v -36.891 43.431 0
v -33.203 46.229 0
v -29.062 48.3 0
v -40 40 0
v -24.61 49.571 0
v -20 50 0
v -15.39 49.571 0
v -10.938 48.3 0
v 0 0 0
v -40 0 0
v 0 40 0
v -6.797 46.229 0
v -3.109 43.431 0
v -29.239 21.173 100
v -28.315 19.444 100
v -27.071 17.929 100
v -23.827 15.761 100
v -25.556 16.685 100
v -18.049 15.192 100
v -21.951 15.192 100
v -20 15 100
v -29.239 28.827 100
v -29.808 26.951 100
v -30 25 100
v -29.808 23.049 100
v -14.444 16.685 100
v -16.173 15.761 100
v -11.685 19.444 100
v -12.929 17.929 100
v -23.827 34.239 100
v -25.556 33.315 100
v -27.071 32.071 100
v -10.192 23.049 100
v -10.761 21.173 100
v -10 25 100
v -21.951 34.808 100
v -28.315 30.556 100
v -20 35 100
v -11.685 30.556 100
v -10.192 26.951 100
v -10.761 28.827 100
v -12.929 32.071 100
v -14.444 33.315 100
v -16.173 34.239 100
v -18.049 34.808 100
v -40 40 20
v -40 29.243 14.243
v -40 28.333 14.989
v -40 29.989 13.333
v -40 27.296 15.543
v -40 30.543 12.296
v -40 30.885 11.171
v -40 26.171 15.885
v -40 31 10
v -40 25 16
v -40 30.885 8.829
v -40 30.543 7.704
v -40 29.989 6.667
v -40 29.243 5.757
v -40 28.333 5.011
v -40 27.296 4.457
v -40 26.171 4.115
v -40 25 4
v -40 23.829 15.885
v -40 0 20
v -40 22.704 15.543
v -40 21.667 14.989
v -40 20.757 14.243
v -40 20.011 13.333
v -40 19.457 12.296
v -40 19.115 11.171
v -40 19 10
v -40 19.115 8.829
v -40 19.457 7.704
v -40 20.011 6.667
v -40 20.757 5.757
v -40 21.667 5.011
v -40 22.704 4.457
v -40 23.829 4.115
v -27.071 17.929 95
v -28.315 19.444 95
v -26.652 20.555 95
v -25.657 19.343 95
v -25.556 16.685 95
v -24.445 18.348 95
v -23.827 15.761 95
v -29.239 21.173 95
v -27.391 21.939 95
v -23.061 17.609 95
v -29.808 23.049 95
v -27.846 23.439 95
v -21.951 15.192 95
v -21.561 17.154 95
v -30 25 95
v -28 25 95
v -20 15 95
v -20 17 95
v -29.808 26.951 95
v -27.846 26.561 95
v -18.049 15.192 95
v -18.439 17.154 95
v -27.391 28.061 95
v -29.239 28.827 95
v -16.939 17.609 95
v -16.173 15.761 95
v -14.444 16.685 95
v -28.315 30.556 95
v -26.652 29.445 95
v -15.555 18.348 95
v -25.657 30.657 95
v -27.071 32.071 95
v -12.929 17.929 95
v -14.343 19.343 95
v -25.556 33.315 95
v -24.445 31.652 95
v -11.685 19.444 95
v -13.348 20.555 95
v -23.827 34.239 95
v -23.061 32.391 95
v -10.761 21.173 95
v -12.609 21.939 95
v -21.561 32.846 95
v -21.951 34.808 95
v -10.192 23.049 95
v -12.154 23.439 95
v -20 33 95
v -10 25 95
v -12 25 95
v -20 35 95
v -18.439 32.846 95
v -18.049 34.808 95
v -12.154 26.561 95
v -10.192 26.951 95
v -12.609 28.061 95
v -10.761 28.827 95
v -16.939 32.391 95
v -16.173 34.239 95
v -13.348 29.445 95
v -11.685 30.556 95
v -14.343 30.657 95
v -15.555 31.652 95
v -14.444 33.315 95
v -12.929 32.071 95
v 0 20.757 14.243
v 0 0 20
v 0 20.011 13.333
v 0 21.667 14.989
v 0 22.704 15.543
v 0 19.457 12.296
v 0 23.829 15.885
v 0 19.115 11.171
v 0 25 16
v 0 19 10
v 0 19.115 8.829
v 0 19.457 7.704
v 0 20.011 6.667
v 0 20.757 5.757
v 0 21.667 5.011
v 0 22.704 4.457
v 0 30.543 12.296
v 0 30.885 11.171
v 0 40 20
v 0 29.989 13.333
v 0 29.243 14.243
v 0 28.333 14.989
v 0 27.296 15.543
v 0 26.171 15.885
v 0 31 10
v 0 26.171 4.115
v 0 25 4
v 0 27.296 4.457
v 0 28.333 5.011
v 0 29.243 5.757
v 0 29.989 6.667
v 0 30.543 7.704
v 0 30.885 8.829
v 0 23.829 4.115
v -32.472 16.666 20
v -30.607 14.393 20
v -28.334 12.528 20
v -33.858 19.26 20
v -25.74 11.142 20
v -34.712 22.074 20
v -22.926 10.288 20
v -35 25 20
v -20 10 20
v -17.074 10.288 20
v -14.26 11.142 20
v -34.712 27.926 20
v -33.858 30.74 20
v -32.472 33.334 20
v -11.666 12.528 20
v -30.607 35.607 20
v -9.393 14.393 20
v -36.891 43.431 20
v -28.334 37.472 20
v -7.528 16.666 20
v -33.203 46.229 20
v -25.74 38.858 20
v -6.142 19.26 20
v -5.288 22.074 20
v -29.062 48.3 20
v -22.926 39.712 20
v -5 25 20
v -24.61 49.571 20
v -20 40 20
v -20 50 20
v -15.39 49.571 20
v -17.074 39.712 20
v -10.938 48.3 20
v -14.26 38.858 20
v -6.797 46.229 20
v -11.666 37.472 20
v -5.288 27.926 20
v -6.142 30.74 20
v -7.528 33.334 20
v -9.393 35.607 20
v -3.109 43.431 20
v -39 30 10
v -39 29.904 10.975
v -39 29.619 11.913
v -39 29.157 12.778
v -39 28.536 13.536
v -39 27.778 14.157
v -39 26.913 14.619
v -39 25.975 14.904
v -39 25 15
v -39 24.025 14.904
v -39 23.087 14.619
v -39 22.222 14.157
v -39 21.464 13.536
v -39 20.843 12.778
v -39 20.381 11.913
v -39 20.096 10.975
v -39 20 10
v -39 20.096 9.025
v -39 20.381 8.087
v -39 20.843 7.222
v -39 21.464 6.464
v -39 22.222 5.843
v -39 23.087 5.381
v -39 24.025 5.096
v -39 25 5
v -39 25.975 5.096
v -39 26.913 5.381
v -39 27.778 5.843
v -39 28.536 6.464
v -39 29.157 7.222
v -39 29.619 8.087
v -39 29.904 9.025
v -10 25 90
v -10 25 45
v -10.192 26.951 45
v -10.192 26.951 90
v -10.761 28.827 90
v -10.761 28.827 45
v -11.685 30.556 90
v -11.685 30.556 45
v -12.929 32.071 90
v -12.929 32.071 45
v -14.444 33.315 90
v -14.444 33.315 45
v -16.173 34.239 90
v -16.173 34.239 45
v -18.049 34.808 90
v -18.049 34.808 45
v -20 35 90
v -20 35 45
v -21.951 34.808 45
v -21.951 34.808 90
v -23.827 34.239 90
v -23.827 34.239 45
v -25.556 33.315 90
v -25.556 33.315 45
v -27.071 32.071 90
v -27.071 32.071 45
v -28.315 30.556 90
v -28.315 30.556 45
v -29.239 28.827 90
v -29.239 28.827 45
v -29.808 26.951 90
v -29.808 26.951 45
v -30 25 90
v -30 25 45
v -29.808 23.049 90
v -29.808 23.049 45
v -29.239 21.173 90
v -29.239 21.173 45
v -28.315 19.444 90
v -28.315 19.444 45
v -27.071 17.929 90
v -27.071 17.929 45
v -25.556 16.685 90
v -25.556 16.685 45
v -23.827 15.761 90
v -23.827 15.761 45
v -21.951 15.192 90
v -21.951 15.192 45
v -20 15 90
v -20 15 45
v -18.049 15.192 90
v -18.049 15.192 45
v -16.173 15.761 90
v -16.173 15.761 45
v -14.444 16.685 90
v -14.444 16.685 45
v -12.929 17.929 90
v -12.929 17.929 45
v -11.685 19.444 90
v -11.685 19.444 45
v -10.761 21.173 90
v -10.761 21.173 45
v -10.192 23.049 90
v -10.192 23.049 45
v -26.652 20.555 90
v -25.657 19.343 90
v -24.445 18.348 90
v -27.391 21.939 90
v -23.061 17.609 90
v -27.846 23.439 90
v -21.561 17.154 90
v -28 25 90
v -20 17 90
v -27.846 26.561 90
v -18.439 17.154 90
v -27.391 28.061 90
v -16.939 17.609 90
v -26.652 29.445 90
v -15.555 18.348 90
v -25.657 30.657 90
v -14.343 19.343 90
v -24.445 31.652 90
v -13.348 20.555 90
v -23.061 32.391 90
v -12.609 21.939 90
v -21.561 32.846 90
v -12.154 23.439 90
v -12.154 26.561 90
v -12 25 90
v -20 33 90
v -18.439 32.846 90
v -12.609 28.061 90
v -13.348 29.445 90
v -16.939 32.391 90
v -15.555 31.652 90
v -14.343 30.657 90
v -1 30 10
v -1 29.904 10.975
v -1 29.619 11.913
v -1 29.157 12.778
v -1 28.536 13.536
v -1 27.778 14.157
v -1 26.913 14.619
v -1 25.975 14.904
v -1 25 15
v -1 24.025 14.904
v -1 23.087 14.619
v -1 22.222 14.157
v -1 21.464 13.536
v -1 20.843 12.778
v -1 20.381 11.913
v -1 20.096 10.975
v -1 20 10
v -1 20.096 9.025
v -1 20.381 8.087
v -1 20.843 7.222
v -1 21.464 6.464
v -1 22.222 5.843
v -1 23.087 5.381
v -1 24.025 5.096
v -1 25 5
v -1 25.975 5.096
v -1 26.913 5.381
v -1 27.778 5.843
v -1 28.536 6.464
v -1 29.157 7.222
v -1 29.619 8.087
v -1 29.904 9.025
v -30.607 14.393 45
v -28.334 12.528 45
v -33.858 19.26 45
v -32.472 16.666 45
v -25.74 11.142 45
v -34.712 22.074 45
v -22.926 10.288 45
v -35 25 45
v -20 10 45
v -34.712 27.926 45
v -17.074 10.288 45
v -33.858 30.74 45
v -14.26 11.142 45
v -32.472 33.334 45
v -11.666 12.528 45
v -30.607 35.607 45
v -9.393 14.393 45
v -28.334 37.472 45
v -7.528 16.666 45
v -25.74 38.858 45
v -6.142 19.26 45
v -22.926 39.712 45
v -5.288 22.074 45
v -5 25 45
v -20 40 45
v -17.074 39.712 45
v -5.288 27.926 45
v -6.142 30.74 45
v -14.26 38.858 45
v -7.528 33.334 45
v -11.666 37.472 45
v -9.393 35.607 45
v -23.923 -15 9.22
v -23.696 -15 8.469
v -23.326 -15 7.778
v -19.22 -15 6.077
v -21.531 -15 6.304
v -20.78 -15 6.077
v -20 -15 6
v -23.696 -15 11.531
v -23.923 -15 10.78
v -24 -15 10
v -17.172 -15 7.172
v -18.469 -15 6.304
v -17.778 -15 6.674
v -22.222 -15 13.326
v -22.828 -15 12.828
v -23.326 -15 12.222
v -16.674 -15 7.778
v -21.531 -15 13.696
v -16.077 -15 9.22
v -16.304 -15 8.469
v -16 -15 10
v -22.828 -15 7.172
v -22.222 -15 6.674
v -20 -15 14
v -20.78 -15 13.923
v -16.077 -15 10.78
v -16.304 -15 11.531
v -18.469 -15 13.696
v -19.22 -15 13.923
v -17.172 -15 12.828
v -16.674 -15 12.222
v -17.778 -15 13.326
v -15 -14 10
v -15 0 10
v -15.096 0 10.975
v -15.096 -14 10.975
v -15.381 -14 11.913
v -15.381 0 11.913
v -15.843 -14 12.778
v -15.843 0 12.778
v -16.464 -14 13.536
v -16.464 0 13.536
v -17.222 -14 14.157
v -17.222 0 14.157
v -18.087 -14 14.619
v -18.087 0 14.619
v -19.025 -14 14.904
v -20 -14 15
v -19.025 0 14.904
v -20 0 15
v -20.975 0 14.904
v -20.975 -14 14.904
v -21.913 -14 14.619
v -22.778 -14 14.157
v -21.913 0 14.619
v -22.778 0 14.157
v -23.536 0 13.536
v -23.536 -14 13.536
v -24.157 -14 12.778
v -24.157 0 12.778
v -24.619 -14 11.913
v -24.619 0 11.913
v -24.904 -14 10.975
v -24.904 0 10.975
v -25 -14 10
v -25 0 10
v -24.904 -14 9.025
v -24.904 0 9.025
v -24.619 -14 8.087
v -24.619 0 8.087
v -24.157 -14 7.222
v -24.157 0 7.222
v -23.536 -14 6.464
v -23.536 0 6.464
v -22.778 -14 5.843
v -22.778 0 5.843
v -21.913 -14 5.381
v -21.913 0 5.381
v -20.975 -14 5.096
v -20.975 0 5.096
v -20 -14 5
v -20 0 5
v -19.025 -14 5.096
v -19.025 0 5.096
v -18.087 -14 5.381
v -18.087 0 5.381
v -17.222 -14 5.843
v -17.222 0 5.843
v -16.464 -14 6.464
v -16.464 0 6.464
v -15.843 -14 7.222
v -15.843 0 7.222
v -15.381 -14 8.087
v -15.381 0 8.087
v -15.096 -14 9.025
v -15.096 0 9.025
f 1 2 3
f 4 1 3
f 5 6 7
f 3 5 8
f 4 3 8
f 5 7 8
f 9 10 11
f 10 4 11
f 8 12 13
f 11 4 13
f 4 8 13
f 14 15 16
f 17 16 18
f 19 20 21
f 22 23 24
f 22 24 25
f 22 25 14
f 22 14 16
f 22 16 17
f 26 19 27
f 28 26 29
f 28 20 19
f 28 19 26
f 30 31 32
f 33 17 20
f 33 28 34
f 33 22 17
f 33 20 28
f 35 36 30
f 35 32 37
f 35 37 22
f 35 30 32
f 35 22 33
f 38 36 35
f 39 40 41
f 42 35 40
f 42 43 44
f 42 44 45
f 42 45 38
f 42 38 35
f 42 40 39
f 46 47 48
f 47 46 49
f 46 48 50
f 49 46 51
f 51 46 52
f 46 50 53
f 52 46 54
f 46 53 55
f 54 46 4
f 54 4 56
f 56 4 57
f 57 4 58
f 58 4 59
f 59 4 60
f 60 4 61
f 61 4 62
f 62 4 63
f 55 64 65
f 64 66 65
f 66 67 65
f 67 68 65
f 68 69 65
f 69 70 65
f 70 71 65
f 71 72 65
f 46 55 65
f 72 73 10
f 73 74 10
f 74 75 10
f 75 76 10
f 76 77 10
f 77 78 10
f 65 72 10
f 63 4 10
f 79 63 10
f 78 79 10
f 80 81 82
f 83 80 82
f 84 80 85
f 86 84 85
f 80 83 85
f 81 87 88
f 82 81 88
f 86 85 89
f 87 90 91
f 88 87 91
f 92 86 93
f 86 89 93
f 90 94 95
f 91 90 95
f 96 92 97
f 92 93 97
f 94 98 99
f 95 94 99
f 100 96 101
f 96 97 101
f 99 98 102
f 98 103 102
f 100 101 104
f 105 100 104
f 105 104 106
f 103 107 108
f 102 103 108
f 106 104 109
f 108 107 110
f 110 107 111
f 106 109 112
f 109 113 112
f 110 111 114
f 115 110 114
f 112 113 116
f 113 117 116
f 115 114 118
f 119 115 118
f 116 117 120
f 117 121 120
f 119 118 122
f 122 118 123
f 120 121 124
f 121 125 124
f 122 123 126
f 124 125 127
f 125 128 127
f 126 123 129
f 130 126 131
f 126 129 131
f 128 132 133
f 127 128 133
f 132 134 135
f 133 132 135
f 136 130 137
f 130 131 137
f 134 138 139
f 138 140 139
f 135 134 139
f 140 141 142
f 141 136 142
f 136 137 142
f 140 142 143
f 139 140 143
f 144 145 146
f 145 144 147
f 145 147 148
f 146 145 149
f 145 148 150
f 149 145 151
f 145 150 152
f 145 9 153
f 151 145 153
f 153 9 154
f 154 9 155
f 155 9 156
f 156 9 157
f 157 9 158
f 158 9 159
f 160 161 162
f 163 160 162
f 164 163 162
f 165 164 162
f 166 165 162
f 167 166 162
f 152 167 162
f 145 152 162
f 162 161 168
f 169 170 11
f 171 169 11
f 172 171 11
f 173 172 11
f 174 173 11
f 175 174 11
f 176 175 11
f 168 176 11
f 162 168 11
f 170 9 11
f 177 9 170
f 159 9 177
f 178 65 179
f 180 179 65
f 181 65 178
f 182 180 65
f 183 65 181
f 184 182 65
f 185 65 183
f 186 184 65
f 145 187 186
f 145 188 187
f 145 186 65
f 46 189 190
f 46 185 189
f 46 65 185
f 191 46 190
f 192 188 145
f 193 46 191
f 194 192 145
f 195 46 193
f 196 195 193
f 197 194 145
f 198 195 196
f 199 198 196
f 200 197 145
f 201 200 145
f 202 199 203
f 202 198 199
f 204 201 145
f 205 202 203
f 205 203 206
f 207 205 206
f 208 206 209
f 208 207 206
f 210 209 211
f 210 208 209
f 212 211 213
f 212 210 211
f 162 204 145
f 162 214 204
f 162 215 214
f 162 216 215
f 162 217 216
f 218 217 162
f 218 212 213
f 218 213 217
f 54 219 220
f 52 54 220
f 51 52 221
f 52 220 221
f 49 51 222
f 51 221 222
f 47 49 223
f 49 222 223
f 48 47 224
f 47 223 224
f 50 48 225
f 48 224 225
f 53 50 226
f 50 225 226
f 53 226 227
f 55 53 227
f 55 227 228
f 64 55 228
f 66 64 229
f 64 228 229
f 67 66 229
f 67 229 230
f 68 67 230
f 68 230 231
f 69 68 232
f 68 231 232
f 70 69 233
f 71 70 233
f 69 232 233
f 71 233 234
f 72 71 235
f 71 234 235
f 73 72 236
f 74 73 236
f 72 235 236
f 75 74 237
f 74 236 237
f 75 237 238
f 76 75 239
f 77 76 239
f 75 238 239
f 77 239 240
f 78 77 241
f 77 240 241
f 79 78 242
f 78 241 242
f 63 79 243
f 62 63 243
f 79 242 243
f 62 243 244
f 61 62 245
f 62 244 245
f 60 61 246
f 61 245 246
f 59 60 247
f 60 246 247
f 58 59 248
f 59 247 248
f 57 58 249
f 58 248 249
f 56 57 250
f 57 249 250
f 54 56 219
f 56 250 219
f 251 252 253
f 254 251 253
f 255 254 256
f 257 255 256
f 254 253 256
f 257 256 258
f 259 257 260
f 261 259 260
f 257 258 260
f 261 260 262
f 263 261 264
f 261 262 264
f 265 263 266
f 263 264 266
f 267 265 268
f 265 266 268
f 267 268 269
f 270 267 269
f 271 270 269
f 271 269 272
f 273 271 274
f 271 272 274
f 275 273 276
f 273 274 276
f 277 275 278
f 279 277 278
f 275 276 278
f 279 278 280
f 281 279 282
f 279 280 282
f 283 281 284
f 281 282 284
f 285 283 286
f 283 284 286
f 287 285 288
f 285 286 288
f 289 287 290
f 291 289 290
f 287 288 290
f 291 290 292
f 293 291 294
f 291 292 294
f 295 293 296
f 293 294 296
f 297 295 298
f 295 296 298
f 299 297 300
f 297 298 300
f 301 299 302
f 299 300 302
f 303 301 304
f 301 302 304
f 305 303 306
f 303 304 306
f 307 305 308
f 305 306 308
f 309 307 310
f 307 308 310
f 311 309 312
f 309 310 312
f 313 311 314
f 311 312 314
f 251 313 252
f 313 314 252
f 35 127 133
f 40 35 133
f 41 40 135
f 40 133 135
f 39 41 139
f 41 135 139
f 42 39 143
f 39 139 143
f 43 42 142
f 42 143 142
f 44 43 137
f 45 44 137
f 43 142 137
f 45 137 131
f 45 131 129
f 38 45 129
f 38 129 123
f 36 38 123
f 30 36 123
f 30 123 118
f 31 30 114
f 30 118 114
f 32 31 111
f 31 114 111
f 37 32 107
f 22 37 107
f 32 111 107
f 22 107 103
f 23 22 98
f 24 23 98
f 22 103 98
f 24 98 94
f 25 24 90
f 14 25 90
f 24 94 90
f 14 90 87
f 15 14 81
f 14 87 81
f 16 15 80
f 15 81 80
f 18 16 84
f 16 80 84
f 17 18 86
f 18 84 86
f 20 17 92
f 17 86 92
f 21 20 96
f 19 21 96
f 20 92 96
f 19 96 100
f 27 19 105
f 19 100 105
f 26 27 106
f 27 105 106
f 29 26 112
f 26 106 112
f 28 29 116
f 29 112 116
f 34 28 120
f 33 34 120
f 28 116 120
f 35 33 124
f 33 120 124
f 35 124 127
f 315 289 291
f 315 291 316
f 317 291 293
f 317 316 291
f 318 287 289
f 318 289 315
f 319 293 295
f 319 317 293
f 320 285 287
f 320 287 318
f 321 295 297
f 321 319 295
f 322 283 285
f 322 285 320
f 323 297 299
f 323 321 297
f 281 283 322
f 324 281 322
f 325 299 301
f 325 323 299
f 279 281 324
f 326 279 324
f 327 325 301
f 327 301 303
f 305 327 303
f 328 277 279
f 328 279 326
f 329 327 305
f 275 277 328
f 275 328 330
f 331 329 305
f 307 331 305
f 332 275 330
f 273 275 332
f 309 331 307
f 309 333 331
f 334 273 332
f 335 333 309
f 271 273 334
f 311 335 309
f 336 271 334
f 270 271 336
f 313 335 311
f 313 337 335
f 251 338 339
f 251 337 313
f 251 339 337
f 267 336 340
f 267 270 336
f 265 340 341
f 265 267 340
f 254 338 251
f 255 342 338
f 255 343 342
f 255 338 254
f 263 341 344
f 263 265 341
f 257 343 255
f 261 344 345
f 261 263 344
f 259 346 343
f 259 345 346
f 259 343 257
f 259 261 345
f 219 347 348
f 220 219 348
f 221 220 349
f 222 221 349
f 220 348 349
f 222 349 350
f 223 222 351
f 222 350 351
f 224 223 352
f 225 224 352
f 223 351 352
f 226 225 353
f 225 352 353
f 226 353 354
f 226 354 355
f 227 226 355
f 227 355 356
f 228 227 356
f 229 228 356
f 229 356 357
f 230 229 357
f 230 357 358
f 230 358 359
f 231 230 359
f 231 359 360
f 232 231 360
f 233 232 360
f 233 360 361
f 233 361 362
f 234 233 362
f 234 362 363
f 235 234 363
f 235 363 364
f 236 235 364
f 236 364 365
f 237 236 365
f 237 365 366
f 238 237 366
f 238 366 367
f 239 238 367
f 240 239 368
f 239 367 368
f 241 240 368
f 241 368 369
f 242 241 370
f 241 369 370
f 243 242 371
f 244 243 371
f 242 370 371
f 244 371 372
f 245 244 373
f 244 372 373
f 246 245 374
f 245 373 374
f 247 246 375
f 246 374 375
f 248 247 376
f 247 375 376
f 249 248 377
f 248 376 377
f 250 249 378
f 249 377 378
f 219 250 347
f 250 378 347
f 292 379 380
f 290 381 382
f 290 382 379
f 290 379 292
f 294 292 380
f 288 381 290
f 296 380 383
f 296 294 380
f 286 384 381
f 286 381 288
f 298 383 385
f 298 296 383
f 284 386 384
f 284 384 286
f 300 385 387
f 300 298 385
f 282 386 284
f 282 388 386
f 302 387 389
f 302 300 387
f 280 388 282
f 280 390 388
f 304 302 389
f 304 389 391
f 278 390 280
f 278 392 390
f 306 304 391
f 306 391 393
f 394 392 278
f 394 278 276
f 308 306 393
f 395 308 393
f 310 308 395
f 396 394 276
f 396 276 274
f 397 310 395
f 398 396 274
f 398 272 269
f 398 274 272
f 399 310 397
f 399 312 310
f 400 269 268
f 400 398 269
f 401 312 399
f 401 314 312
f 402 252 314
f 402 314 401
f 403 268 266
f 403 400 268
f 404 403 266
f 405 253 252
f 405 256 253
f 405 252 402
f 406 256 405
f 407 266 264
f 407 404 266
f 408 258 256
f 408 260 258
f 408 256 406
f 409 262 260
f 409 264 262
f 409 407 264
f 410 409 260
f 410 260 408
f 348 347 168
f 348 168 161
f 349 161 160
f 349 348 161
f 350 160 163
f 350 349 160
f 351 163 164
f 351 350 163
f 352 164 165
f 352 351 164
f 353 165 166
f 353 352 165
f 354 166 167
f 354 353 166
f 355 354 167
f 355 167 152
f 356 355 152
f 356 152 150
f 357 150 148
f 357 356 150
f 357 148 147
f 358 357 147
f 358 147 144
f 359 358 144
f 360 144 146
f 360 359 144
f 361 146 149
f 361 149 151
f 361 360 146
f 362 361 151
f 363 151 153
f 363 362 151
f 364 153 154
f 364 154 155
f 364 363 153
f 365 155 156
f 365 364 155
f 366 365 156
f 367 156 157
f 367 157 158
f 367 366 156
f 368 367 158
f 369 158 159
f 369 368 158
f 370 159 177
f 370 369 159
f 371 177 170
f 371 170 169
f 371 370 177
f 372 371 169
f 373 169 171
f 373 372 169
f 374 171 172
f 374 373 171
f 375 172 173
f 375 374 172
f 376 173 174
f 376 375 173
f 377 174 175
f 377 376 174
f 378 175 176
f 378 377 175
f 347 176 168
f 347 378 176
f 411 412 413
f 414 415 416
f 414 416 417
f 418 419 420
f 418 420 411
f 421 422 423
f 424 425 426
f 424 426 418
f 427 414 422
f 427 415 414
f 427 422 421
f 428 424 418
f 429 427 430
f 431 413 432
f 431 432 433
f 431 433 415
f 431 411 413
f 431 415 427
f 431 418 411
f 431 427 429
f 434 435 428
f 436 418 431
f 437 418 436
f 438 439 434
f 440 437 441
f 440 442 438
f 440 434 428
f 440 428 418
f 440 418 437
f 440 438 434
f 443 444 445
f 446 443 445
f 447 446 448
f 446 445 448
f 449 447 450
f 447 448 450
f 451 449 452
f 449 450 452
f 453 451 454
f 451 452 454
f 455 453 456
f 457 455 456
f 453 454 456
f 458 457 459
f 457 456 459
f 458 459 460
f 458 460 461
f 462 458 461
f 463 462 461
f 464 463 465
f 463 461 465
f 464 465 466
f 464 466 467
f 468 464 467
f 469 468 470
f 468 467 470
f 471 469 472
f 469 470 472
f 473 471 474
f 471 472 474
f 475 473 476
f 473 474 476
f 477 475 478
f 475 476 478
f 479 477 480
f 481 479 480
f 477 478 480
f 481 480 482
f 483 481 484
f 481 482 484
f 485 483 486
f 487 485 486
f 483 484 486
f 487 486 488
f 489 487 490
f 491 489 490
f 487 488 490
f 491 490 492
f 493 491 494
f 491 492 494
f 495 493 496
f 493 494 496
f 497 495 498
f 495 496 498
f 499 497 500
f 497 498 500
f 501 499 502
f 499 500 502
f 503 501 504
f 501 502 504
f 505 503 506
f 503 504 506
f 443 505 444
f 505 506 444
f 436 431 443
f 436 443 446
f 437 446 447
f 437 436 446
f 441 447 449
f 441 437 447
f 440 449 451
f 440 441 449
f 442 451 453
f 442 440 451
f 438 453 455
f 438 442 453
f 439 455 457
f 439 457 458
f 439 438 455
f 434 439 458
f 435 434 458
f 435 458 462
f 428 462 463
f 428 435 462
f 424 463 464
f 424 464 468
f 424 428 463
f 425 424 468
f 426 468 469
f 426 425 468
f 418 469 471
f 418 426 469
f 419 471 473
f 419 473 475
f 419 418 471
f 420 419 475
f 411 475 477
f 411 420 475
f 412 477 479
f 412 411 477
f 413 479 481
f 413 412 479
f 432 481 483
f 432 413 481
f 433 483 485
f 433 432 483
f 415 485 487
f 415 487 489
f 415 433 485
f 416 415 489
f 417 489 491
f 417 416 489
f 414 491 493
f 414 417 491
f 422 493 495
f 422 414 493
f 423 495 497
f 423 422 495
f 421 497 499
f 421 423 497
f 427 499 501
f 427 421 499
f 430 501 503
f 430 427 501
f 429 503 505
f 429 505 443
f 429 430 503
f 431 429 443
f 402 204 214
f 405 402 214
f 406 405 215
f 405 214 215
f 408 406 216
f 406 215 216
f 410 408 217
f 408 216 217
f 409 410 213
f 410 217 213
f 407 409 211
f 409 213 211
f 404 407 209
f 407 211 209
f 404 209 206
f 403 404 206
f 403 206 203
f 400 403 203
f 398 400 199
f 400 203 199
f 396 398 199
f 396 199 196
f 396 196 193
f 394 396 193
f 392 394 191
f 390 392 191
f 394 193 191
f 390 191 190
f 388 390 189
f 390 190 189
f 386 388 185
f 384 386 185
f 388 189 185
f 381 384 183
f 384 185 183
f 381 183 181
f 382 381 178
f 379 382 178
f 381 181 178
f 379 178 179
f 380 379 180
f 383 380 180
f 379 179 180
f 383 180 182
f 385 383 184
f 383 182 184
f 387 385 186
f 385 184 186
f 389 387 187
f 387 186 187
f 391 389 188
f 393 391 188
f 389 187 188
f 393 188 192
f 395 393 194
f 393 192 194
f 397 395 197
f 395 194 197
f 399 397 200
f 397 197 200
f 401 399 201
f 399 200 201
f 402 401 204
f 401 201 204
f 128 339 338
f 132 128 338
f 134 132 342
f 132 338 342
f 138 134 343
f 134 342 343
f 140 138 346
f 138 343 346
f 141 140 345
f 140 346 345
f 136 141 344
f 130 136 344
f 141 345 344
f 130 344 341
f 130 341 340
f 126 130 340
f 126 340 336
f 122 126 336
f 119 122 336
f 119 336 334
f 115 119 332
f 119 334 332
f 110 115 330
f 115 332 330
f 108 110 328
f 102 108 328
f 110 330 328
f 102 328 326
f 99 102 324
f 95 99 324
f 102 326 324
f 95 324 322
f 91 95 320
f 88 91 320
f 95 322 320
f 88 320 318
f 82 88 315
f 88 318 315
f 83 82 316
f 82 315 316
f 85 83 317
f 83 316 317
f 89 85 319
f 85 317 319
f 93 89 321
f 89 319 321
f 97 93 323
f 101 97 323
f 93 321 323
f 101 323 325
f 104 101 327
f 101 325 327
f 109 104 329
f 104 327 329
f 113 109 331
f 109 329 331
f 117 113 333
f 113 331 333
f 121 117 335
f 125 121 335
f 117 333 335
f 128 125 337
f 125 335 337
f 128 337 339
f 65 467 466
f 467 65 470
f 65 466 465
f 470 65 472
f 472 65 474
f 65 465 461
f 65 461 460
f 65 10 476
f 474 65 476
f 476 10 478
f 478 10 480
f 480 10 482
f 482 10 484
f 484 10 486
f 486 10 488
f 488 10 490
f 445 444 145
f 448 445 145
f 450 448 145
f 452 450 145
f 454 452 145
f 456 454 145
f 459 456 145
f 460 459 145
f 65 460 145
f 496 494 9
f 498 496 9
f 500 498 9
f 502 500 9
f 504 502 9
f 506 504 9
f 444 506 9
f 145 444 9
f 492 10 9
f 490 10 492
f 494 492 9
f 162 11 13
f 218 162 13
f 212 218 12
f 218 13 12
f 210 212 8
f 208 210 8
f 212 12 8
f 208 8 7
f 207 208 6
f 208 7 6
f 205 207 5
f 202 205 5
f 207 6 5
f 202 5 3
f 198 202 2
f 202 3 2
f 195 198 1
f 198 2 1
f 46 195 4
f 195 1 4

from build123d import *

# Parameters (mm, degrees)
F1_DEPTH  = 20
F2_R      = 5
F3_DEPTH  = 15
F4_R      = 15
F5_DEPTH  = 25
F6_R      = 10
F7_DEPTH  = 45
F8_R      = 8
F9_DEPTH  = 5
F10_R     = 10
F10_R_2   = 8
F11_DEPTH = 5
F12_R     = 5
F13_DEPTH = 45
F14_SIZE  = 1


with BuildPart() as f1:
    # F0 (on Top) → F1 (new body)
    with BuildSketch(Plane.XY):
        with BuildLine():
            Line((-40, 0), (0, 0))
            Line((0, 0), (0, 40))
            ThreePointArc((0, 40), (-20, 50), (-40, 40))
            Line((-40, 40), (-40, 0))
        make_face()
    extrude(amount=F1_DEPTH)

    # F2 (on face) → F3 (join)
    with BuildSketch(Plane.XZ):
        with Locations((-20, 10)):
            Circle(F2_R)
    extrude(amount=F3_DEPTH)

    # F4 (on face) → F5 (join)
    with BuildSketch(Plane.XY.offset(20)):
        with Locations((-20, 25)):
            Circle(F4_R)
    extrude(amount=F5_DEPTH)

    # F6 (on face) → F7 (join)
    with BuildSketch(Plane.XY.offset(45)):
        with Locations((-20, 25)):
            Circle(F6_R)
    extrude(amount=F7_DEPTH)

    # F8 (on face) → F9 (join)
    with BuildSketch(Plane.XY.offset(90)):
        with Locations((-20, 25)):
            Circle(F8_R)
    extrude(amount=F9_DEPTH)

    # F10 (on face) → F11 (join)
    with BuildSketch(Plane.XY.offset(95)):
        with Locations((-20, 25)):
            Circle(F10_R)
        with Locations((-20, 25)):
            Circle(F10_R_2, mode=Mode.SUBTRACT)
        with Locations((-20, 25)):
            Circle(F10_R_2)
    extrude(amount=F11_DEPTH)

    # F12 (on face) → F13 (cut)
    with BuildSketch(Plane.YZ):
        with Locations((25, 10)):
            Circle(F12_R)
    extrude(amount=-F13_DEPTH, mode=Mode.SUBTRACT)

    # F14
    f14_edges = [f1.edges().sort_by_distance(p)[0] for p in [
        (-25, -15, 10),
        (0, 20, 10),
        (-40, 20, 10),
    ]]
    chamfer(f14_edges, length=F14_SIZE)


solid = f1.part
